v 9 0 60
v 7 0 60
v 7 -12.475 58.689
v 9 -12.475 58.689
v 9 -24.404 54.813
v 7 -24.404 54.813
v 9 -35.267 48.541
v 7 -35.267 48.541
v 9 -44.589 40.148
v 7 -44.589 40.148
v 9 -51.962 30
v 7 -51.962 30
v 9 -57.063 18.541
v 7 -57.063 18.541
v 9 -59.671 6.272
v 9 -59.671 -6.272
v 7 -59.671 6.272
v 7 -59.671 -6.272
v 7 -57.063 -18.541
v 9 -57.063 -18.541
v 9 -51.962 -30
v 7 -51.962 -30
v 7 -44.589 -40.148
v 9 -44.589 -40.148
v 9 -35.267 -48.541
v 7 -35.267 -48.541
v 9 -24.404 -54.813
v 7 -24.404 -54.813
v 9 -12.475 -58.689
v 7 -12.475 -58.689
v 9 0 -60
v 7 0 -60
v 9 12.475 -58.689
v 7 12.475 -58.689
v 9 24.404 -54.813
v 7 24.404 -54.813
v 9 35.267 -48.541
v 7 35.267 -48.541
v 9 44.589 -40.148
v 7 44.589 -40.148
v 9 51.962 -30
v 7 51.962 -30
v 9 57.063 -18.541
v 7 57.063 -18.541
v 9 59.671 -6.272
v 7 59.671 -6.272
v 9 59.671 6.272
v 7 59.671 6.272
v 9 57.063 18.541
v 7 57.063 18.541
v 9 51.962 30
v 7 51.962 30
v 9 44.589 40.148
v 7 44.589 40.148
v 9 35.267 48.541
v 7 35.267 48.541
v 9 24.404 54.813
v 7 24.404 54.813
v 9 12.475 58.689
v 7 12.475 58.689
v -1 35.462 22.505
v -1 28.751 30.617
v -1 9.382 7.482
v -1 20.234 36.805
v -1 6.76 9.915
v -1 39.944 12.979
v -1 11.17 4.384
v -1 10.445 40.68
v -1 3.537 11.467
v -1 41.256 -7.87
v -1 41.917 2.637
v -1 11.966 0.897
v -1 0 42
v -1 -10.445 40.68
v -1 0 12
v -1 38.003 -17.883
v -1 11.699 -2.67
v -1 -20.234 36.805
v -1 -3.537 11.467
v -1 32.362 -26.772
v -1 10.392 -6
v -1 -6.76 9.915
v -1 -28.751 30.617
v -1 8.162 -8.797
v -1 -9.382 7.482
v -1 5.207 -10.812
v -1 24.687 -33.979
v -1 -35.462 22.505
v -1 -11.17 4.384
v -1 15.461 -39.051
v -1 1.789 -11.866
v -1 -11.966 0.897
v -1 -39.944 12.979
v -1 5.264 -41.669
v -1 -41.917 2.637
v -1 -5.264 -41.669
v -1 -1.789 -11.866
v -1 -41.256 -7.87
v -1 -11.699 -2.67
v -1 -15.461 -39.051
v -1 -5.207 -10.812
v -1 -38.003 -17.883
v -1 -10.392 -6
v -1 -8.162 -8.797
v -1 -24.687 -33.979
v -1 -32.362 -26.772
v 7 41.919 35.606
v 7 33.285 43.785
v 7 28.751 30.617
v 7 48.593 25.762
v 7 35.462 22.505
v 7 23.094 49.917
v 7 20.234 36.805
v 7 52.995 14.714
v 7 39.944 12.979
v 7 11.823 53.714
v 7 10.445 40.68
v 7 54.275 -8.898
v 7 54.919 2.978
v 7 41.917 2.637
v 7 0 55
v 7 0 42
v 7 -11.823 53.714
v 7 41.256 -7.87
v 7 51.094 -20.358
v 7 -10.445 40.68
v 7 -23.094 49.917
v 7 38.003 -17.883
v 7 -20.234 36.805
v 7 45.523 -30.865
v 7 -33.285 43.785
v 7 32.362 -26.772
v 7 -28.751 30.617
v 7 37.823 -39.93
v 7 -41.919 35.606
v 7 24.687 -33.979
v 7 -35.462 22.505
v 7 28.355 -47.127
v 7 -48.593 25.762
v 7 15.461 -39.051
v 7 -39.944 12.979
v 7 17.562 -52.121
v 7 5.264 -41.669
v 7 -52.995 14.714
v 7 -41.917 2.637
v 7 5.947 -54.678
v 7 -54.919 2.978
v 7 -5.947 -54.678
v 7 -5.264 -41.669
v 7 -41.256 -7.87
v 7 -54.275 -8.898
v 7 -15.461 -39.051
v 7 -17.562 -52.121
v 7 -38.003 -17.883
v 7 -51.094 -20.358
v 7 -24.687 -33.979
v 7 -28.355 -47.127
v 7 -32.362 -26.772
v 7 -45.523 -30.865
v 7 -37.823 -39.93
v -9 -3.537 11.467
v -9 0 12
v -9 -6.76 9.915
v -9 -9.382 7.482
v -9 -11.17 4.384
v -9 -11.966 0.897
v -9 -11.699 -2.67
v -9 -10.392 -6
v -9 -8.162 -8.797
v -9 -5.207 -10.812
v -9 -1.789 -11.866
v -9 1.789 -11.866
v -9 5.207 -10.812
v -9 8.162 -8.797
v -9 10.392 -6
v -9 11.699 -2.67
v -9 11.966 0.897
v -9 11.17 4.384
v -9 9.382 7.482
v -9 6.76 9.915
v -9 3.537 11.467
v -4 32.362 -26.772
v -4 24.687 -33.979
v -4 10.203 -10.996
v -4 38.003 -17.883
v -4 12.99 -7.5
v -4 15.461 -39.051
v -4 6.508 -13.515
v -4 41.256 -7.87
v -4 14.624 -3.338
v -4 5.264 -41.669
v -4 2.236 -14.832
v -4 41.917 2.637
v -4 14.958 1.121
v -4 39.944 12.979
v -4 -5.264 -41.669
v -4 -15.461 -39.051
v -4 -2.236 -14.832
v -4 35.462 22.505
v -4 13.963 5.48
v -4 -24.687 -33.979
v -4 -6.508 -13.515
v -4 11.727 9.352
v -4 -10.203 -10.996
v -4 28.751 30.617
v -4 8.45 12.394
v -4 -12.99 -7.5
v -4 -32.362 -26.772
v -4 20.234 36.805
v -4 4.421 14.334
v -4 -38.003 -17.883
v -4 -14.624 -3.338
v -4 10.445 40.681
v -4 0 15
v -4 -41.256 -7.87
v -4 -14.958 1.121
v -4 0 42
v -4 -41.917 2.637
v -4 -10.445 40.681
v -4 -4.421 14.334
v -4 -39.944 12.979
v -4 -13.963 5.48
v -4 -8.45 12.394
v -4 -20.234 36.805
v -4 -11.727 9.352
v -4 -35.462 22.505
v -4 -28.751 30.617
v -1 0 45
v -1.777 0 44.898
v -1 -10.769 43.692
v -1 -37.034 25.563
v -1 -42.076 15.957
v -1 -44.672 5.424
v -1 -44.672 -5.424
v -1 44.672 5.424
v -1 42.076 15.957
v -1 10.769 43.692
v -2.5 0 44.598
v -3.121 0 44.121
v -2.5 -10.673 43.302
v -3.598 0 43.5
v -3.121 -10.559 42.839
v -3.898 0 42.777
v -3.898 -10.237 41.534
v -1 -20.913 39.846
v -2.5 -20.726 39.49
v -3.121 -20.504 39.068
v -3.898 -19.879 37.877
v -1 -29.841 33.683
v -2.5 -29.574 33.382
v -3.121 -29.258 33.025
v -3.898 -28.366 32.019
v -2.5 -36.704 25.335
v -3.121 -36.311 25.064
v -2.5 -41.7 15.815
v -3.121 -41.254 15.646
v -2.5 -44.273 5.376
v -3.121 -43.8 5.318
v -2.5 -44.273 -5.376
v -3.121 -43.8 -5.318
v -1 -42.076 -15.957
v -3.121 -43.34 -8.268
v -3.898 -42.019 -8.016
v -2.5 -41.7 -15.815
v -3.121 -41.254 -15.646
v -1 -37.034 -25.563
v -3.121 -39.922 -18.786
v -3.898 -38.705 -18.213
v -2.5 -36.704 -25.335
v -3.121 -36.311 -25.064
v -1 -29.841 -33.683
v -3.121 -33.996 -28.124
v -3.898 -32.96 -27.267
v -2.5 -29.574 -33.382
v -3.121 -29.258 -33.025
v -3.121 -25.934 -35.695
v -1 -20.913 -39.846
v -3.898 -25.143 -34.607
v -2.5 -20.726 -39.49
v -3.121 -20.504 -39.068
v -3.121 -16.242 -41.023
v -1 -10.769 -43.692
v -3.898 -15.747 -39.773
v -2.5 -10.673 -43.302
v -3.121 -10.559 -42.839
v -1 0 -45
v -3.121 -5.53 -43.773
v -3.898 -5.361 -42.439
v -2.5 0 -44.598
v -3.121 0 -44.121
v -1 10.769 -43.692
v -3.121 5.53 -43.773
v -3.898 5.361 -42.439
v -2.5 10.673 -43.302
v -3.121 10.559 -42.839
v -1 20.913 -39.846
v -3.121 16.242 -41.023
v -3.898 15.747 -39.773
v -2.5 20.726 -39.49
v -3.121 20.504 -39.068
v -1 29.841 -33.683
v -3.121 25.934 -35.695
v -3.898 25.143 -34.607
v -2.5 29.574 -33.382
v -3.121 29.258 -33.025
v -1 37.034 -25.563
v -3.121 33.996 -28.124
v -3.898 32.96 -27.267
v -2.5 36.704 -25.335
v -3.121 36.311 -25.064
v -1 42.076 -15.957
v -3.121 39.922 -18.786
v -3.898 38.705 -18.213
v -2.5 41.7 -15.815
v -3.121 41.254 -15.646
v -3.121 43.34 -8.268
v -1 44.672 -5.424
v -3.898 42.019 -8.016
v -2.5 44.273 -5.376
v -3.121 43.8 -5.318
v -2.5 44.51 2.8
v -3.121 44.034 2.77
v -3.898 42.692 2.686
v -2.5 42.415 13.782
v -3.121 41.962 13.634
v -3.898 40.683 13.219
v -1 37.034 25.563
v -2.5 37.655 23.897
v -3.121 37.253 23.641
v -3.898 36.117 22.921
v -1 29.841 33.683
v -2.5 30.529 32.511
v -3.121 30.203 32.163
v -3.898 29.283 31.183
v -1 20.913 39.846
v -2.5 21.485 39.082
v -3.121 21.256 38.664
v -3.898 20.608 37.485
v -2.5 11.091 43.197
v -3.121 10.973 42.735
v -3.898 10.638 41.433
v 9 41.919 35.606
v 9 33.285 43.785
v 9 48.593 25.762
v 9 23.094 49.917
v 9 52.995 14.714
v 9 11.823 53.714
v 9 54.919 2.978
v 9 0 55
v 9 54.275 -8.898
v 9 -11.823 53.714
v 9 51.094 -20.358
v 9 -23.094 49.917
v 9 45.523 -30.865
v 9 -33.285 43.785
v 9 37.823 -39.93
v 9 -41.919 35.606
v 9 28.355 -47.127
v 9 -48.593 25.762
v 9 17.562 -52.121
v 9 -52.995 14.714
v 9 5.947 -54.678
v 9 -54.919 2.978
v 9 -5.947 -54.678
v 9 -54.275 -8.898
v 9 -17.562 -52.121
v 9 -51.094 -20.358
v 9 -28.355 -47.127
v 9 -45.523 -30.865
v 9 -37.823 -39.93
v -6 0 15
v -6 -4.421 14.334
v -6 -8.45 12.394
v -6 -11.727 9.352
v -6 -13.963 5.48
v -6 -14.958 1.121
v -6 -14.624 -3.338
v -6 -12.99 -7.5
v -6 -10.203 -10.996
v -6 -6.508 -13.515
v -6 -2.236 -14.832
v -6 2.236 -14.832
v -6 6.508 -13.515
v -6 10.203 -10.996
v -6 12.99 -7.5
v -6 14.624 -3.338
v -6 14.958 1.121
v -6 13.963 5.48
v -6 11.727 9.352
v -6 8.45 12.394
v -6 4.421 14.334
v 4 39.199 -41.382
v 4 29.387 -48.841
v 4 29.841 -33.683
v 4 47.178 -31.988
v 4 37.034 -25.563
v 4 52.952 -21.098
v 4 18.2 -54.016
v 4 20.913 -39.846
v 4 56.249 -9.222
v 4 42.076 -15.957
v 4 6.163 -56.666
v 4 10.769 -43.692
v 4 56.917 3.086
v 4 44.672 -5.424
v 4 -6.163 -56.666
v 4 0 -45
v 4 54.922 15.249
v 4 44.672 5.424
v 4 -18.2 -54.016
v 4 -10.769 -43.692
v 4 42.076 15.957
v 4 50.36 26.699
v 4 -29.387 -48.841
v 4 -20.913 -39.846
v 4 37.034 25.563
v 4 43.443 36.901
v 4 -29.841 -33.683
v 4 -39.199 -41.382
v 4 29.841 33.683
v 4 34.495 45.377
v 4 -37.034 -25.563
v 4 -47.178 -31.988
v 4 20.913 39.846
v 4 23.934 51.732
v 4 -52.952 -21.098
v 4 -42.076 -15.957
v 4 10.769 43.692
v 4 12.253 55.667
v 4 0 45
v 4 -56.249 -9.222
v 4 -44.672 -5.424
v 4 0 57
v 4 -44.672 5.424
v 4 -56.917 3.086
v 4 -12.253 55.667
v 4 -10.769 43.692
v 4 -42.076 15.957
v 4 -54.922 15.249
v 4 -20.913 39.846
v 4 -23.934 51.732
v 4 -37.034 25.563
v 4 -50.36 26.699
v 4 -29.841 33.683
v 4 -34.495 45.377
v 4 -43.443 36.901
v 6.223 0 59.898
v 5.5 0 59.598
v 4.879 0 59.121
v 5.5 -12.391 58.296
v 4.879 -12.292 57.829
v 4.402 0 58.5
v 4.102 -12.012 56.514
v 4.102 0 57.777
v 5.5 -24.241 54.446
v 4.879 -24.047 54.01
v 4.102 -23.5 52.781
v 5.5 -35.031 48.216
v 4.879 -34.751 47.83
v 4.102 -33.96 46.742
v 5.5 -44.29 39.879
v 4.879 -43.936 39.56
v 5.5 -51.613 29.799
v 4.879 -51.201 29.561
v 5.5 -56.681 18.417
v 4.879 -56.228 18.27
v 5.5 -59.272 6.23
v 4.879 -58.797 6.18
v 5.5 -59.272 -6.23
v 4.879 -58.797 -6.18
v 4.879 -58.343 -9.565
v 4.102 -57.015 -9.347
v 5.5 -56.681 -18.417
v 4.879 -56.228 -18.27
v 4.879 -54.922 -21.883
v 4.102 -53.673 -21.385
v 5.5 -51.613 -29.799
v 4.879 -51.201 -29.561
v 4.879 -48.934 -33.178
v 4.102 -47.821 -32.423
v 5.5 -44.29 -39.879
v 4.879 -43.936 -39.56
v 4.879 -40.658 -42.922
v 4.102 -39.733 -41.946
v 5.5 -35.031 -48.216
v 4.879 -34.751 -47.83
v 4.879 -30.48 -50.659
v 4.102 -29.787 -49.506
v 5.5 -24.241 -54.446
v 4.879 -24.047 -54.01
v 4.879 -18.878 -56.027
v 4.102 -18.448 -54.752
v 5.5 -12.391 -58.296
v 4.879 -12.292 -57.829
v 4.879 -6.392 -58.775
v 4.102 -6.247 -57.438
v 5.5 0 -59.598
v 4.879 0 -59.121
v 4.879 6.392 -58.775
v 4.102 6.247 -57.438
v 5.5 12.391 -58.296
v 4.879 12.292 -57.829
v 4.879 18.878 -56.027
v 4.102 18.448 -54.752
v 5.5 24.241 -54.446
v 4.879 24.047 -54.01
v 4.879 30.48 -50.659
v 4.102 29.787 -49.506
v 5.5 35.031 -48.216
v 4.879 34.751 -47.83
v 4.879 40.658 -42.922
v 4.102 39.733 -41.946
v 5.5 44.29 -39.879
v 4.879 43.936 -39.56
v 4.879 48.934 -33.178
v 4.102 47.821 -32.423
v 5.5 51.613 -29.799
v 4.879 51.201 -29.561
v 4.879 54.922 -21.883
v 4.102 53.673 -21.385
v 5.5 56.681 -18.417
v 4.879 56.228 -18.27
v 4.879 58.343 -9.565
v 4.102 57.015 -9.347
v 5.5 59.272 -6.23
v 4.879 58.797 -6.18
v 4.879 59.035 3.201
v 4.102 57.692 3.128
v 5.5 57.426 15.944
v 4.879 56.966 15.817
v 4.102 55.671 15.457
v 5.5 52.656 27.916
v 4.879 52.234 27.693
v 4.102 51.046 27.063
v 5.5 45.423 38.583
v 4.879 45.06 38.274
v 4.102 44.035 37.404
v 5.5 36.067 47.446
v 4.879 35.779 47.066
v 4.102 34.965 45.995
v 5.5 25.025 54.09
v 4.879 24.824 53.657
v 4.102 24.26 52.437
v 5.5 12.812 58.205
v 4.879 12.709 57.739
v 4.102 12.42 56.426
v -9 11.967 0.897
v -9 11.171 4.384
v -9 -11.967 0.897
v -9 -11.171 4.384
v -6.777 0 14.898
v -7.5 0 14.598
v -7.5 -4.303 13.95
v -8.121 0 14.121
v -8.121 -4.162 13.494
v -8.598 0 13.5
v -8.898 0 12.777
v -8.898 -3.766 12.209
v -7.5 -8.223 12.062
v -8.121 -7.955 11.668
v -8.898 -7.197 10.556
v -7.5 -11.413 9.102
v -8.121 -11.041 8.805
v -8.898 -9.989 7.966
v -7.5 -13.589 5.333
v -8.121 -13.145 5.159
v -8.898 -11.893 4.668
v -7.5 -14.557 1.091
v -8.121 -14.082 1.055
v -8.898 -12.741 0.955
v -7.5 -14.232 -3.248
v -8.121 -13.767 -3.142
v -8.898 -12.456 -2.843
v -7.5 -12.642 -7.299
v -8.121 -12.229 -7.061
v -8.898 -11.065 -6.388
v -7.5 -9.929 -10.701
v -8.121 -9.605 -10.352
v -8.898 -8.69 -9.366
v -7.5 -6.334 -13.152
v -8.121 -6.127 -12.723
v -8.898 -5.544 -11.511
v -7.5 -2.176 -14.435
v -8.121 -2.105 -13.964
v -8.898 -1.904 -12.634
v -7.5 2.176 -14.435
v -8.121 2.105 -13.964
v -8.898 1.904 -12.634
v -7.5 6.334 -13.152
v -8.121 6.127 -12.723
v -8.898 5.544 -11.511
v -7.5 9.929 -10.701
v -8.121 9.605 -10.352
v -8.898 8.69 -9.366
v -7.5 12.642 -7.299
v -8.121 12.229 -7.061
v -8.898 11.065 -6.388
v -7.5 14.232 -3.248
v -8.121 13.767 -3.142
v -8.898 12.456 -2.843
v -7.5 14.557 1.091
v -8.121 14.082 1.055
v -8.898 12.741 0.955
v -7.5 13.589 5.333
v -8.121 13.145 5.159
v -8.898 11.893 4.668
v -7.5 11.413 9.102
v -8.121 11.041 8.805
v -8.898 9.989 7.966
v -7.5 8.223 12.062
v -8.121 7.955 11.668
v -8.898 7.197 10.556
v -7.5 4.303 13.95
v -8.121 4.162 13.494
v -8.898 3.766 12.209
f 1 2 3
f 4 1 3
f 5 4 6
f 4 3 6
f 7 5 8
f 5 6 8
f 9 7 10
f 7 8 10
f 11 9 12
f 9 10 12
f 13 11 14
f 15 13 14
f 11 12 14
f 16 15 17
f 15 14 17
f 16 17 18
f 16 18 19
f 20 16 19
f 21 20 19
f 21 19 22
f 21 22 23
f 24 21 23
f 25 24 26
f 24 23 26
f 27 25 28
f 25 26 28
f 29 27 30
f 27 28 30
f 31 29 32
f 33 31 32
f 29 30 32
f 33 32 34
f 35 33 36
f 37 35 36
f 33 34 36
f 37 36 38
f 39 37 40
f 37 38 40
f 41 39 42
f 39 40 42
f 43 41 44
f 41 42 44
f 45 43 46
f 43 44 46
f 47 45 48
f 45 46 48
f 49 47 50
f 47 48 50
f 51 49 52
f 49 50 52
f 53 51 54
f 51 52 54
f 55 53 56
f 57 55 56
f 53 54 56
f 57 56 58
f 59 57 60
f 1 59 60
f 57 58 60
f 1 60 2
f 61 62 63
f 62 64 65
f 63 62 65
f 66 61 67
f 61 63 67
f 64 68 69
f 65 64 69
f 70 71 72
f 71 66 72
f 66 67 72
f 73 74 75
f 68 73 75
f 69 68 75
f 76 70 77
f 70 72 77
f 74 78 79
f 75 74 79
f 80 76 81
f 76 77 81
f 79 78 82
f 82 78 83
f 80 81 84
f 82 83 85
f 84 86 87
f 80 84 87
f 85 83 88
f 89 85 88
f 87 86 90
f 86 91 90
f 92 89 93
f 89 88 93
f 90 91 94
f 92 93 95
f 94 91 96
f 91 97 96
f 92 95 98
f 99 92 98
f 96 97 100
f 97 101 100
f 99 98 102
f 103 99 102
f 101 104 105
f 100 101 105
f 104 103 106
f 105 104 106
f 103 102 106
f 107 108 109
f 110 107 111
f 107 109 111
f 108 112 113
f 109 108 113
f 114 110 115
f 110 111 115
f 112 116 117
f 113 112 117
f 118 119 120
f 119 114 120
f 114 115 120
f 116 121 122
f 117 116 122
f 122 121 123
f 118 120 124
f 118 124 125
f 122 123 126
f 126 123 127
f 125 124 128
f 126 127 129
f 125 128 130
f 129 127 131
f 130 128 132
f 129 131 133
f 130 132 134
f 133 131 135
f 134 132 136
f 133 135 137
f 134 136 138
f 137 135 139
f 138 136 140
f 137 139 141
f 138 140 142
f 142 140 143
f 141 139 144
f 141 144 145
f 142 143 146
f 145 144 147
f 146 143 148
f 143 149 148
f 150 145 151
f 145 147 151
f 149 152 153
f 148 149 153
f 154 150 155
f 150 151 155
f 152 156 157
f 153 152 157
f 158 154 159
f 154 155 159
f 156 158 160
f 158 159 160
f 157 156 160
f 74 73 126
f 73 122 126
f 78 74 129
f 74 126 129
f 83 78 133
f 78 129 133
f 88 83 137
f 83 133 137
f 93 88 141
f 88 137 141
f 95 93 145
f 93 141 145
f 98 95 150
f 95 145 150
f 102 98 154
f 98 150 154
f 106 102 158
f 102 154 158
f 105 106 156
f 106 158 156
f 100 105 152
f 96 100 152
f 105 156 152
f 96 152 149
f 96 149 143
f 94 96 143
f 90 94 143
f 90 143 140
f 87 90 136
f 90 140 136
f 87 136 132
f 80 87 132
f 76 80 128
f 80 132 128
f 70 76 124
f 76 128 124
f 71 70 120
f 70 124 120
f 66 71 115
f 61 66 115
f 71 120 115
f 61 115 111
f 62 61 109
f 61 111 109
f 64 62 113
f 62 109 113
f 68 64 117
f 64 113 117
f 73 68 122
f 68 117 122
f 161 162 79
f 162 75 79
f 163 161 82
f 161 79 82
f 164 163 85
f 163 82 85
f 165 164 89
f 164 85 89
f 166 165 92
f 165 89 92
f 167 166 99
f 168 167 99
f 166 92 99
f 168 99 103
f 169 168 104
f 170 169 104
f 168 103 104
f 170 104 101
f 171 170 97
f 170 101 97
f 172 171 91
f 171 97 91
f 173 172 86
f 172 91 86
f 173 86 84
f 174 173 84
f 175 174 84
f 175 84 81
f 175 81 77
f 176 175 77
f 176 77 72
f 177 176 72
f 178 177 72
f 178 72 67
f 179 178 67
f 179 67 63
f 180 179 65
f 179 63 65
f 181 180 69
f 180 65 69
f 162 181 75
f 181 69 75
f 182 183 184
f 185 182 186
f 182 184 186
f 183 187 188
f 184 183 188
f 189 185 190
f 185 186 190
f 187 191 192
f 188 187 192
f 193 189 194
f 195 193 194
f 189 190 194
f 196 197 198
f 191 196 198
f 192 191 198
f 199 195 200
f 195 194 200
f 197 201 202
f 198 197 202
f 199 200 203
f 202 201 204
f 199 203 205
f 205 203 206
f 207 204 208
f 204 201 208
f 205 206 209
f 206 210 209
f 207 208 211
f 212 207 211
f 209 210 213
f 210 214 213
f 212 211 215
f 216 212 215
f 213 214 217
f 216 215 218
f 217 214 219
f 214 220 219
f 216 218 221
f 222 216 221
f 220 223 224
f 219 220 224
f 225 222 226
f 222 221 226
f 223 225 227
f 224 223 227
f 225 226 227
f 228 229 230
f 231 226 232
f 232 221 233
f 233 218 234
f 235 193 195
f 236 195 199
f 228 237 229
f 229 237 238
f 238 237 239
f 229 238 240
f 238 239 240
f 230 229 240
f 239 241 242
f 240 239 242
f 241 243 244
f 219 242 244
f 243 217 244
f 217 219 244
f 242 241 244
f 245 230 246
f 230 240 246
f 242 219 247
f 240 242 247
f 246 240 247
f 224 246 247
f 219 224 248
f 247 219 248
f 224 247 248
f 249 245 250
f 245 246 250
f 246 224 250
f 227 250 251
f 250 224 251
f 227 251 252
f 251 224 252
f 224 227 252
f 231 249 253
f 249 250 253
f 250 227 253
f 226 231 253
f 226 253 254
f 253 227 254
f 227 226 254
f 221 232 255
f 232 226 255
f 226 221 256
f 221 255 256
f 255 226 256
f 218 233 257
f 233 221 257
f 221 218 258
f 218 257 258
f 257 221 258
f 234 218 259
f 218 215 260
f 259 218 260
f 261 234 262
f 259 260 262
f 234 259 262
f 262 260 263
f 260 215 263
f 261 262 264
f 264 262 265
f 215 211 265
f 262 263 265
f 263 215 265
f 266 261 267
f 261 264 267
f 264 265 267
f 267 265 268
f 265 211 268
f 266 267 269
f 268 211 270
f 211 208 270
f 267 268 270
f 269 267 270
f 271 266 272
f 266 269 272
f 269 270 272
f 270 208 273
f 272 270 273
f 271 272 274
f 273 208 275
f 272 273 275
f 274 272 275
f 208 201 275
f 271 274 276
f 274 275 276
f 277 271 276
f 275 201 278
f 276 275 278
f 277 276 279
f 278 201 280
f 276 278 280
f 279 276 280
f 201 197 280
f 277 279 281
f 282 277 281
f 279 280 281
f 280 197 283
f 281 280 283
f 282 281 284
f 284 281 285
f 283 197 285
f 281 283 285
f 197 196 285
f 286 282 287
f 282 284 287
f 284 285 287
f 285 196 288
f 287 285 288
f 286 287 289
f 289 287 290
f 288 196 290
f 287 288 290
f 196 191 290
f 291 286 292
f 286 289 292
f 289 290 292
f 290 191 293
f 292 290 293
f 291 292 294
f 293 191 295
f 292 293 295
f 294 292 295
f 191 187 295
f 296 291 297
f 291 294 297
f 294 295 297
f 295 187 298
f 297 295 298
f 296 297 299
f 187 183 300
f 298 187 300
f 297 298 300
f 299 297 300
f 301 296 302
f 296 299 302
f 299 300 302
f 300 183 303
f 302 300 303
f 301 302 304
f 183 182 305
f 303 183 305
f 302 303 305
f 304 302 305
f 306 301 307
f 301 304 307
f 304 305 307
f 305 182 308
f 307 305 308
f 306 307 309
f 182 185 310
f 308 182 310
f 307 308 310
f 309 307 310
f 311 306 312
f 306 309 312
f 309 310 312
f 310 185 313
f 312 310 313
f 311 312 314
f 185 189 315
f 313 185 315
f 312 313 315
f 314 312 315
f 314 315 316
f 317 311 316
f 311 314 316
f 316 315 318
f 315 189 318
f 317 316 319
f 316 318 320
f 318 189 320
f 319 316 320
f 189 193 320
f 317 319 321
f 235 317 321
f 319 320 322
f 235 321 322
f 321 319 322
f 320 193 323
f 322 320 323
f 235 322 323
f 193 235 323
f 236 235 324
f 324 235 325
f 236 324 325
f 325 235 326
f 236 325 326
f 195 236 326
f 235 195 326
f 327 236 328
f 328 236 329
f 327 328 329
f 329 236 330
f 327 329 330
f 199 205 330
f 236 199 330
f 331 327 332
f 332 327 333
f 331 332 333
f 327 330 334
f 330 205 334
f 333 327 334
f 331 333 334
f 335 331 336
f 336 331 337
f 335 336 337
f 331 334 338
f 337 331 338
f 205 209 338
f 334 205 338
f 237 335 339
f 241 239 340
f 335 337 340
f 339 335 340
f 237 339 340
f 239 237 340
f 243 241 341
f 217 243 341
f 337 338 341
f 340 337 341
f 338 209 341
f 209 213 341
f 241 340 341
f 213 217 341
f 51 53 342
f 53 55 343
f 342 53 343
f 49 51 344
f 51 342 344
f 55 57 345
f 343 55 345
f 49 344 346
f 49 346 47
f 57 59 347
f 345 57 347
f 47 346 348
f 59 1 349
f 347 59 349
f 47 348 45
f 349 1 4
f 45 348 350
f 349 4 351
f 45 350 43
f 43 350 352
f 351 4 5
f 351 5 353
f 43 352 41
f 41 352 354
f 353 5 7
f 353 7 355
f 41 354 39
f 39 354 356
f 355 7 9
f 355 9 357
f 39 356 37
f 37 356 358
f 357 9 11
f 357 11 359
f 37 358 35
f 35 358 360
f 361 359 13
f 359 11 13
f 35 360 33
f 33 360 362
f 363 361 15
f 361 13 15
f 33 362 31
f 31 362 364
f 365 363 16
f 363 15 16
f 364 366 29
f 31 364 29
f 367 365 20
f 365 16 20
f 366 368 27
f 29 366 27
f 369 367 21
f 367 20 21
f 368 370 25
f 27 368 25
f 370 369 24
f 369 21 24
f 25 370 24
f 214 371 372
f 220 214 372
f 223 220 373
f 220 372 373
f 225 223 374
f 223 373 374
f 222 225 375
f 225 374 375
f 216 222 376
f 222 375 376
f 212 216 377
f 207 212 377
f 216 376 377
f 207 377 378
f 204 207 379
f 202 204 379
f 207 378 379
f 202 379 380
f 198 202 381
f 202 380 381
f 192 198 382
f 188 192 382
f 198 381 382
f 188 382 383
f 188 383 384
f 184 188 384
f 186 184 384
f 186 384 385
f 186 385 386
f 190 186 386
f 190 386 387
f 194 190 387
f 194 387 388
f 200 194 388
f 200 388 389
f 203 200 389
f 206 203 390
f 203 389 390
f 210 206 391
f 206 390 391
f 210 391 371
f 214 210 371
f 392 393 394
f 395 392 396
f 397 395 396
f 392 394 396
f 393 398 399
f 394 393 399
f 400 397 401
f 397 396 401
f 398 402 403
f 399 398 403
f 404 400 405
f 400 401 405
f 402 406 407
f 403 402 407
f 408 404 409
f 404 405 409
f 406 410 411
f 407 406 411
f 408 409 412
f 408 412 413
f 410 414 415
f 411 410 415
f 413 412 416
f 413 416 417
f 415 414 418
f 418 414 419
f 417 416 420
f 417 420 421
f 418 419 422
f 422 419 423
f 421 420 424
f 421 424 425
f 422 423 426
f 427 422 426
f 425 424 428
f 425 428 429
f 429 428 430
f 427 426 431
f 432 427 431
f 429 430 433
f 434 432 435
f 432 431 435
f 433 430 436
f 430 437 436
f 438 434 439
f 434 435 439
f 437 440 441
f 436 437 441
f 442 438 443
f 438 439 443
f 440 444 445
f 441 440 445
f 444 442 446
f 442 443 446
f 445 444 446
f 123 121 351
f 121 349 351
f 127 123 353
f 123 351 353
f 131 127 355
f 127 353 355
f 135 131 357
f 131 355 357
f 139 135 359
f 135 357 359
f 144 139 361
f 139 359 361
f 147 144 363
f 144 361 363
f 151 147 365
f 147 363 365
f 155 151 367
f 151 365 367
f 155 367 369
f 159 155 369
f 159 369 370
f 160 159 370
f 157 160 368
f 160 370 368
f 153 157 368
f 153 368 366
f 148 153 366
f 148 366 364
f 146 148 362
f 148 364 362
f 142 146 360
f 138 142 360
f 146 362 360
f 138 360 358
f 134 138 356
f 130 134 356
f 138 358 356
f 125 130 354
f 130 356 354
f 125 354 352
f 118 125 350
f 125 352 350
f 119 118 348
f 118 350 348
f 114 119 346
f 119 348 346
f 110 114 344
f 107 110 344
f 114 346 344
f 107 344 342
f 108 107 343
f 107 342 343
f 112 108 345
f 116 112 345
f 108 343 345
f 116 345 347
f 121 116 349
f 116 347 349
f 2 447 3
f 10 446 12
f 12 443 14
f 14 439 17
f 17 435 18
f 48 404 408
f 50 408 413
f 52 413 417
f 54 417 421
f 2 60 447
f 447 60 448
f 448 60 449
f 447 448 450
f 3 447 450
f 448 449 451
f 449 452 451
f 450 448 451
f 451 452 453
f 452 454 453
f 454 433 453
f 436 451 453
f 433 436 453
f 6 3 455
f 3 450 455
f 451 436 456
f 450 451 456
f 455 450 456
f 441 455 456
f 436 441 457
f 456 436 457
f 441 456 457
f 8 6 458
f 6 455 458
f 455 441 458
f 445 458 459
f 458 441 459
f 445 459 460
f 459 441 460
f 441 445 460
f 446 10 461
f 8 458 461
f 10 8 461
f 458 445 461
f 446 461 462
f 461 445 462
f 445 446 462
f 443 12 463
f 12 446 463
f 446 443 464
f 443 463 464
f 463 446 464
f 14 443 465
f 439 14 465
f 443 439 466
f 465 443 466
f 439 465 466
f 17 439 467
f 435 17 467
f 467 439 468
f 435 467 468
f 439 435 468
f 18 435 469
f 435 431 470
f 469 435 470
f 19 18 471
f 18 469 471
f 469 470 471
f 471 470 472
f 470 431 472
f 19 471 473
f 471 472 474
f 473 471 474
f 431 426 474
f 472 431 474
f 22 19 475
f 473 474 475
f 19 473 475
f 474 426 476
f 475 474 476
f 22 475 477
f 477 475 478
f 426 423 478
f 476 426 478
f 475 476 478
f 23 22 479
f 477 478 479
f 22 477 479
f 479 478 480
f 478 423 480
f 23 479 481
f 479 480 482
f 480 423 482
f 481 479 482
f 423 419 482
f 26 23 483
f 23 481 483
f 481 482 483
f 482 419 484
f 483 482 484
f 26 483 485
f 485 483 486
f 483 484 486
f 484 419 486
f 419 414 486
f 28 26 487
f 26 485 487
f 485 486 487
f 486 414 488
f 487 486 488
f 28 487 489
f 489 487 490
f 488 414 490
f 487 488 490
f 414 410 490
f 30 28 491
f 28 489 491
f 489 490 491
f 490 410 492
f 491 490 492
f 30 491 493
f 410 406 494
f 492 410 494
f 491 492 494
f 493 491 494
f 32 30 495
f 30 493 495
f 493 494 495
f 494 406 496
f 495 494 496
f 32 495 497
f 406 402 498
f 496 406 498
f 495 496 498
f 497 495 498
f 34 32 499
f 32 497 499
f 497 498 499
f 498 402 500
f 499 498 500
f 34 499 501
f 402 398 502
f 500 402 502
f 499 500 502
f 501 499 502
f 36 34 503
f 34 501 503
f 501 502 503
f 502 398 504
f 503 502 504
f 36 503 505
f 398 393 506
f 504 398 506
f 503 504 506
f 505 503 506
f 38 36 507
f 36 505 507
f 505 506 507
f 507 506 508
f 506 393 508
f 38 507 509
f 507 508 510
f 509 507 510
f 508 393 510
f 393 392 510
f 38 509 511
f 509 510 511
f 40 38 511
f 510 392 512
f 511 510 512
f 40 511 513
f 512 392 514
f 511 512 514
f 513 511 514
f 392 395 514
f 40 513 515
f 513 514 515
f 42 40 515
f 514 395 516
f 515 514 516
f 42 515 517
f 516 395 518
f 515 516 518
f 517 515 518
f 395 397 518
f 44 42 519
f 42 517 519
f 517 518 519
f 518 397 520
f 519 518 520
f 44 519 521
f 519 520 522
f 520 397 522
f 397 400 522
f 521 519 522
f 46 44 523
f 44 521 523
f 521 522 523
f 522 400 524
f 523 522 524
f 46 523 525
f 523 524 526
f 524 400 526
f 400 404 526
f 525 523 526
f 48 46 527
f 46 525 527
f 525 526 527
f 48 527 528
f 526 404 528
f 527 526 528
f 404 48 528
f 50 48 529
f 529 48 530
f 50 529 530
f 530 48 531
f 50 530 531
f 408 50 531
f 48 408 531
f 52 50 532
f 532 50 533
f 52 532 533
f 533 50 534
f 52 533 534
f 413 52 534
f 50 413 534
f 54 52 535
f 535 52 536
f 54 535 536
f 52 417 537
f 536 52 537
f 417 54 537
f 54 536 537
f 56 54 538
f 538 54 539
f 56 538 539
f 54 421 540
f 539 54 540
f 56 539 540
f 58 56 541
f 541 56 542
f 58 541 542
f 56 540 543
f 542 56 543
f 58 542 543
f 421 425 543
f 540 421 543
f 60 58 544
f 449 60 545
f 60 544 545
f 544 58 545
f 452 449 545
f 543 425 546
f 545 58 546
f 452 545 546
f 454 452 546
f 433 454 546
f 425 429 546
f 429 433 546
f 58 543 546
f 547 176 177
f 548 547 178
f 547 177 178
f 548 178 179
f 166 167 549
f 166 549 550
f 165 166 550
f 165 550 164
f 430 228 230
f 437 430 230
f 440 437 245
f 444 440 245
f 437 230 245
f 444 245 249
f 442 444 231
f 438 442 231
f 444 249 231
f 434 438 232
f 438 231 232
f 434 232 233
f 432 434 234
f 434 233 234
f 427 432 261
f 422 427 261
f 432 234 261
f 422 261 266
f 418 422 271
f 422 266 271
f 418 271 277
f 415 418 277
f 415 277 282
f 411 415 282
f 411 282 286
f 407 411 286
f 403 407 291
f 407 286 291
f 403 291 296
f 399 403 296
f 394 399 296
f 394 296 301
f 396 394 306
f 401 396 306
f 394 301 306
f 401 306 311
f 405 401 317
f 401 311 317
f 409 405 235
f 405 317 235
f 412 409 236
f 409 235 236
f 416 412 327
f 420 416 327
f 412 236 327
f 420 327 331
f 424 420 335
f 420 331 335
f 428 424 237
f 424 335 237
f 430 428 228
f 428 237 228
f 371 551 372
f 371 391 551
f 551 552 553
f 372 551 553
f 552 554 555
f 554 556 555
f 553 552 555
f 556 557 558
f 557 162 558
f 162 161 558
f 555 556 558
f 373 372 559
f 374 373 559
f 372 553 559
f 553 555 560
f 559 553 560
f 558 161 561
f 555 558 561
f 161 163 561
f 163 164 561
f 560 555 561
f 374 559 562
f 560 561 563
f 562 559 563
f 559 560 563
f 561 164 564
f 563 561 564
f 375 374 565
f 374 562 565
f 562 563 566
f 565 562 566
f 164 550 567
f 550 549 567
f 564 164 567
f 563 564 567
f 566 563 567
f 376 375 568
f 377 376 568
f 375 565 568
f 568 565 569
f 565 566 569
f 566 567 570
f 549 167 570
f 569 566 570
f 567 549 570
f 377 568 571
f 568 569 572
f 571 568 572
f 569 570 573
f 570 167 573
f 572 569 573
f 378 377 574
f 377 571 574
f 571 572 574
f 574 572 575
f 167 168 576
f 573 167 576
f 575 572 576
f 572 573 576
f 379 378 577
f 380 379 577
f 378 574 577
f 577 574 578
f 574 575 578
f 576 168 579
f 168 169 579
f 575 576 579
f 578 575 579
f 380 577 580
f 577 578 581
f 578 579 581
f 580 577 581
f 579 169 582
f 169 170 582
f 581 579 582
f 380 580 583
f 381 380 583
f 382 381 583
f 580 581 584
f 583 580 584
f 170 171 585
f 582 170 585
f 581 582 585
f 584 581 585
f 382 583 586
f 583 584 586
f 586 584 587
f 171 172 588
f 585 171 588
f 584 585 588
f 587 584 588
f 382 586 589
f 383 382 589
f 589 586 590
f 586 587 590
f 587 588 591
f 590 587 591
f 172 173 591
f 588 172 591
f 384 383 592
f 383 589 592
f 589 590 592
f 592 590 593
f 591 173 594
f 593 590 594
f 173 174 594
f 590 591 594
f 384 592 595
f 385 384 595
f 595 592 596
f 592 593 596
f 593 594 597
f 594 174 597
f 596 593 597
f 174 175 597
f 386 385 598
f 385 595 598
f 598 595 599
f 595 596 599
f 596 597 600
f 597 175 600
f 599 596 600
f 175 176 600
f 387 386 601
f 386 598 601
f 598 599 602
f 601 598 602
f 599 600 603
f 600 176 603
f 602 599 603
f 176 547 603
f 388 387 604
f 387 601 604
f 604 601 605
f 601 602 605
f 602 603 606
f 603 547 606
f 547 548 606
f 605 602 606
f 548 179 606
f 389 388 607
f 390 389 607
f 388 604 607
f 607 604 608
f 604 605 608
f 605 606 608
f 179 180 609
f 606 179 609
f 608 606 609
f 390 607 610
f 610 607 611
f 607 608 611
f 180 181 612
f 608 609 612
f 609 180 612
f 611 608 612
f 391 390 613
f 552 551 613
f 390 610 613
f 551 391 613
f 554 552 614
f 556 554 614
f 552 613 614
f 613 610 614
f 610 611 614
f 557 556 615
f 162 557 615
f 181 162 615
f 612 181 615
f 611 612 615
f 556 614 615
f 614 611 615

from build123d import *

# Parameters (mm, degrees)
FILLET2_R = 3


with BuildPart() as part:
    # Sketch1 → Revolve1 (revolve)
    with BuildSketch(Plane.XY, mode=Mode.PRIVATE) as revolve1_sk:
        Polygon((9, 60), (4, 60), (4, 45), (-4, 45), (-4, 15), (-9, 15), (-9, 12), (-1, 12), (-1, 42), (7, 42), (7, 55), (9, 55), align=None)
    revolve(revolve1_sk.sketch.rotate(Axis((-9, 0, 0), (1, 0, 0)), 90), axis=Axis((-9, 0, 0), (1, 0, 0)))

    # Fillet2
    fillet2_edges = [part.edges().sort_by_distance(p)[0] for p in [
        (-9, 0, -15),
        (-4, 0, -45),
        (4, 0, -60),
    ]]
    fillet(fillet2_edges, radius=FILLET2_R - 0.0001)  # a hair under: the kernel refuses the full size


solid = part.part
